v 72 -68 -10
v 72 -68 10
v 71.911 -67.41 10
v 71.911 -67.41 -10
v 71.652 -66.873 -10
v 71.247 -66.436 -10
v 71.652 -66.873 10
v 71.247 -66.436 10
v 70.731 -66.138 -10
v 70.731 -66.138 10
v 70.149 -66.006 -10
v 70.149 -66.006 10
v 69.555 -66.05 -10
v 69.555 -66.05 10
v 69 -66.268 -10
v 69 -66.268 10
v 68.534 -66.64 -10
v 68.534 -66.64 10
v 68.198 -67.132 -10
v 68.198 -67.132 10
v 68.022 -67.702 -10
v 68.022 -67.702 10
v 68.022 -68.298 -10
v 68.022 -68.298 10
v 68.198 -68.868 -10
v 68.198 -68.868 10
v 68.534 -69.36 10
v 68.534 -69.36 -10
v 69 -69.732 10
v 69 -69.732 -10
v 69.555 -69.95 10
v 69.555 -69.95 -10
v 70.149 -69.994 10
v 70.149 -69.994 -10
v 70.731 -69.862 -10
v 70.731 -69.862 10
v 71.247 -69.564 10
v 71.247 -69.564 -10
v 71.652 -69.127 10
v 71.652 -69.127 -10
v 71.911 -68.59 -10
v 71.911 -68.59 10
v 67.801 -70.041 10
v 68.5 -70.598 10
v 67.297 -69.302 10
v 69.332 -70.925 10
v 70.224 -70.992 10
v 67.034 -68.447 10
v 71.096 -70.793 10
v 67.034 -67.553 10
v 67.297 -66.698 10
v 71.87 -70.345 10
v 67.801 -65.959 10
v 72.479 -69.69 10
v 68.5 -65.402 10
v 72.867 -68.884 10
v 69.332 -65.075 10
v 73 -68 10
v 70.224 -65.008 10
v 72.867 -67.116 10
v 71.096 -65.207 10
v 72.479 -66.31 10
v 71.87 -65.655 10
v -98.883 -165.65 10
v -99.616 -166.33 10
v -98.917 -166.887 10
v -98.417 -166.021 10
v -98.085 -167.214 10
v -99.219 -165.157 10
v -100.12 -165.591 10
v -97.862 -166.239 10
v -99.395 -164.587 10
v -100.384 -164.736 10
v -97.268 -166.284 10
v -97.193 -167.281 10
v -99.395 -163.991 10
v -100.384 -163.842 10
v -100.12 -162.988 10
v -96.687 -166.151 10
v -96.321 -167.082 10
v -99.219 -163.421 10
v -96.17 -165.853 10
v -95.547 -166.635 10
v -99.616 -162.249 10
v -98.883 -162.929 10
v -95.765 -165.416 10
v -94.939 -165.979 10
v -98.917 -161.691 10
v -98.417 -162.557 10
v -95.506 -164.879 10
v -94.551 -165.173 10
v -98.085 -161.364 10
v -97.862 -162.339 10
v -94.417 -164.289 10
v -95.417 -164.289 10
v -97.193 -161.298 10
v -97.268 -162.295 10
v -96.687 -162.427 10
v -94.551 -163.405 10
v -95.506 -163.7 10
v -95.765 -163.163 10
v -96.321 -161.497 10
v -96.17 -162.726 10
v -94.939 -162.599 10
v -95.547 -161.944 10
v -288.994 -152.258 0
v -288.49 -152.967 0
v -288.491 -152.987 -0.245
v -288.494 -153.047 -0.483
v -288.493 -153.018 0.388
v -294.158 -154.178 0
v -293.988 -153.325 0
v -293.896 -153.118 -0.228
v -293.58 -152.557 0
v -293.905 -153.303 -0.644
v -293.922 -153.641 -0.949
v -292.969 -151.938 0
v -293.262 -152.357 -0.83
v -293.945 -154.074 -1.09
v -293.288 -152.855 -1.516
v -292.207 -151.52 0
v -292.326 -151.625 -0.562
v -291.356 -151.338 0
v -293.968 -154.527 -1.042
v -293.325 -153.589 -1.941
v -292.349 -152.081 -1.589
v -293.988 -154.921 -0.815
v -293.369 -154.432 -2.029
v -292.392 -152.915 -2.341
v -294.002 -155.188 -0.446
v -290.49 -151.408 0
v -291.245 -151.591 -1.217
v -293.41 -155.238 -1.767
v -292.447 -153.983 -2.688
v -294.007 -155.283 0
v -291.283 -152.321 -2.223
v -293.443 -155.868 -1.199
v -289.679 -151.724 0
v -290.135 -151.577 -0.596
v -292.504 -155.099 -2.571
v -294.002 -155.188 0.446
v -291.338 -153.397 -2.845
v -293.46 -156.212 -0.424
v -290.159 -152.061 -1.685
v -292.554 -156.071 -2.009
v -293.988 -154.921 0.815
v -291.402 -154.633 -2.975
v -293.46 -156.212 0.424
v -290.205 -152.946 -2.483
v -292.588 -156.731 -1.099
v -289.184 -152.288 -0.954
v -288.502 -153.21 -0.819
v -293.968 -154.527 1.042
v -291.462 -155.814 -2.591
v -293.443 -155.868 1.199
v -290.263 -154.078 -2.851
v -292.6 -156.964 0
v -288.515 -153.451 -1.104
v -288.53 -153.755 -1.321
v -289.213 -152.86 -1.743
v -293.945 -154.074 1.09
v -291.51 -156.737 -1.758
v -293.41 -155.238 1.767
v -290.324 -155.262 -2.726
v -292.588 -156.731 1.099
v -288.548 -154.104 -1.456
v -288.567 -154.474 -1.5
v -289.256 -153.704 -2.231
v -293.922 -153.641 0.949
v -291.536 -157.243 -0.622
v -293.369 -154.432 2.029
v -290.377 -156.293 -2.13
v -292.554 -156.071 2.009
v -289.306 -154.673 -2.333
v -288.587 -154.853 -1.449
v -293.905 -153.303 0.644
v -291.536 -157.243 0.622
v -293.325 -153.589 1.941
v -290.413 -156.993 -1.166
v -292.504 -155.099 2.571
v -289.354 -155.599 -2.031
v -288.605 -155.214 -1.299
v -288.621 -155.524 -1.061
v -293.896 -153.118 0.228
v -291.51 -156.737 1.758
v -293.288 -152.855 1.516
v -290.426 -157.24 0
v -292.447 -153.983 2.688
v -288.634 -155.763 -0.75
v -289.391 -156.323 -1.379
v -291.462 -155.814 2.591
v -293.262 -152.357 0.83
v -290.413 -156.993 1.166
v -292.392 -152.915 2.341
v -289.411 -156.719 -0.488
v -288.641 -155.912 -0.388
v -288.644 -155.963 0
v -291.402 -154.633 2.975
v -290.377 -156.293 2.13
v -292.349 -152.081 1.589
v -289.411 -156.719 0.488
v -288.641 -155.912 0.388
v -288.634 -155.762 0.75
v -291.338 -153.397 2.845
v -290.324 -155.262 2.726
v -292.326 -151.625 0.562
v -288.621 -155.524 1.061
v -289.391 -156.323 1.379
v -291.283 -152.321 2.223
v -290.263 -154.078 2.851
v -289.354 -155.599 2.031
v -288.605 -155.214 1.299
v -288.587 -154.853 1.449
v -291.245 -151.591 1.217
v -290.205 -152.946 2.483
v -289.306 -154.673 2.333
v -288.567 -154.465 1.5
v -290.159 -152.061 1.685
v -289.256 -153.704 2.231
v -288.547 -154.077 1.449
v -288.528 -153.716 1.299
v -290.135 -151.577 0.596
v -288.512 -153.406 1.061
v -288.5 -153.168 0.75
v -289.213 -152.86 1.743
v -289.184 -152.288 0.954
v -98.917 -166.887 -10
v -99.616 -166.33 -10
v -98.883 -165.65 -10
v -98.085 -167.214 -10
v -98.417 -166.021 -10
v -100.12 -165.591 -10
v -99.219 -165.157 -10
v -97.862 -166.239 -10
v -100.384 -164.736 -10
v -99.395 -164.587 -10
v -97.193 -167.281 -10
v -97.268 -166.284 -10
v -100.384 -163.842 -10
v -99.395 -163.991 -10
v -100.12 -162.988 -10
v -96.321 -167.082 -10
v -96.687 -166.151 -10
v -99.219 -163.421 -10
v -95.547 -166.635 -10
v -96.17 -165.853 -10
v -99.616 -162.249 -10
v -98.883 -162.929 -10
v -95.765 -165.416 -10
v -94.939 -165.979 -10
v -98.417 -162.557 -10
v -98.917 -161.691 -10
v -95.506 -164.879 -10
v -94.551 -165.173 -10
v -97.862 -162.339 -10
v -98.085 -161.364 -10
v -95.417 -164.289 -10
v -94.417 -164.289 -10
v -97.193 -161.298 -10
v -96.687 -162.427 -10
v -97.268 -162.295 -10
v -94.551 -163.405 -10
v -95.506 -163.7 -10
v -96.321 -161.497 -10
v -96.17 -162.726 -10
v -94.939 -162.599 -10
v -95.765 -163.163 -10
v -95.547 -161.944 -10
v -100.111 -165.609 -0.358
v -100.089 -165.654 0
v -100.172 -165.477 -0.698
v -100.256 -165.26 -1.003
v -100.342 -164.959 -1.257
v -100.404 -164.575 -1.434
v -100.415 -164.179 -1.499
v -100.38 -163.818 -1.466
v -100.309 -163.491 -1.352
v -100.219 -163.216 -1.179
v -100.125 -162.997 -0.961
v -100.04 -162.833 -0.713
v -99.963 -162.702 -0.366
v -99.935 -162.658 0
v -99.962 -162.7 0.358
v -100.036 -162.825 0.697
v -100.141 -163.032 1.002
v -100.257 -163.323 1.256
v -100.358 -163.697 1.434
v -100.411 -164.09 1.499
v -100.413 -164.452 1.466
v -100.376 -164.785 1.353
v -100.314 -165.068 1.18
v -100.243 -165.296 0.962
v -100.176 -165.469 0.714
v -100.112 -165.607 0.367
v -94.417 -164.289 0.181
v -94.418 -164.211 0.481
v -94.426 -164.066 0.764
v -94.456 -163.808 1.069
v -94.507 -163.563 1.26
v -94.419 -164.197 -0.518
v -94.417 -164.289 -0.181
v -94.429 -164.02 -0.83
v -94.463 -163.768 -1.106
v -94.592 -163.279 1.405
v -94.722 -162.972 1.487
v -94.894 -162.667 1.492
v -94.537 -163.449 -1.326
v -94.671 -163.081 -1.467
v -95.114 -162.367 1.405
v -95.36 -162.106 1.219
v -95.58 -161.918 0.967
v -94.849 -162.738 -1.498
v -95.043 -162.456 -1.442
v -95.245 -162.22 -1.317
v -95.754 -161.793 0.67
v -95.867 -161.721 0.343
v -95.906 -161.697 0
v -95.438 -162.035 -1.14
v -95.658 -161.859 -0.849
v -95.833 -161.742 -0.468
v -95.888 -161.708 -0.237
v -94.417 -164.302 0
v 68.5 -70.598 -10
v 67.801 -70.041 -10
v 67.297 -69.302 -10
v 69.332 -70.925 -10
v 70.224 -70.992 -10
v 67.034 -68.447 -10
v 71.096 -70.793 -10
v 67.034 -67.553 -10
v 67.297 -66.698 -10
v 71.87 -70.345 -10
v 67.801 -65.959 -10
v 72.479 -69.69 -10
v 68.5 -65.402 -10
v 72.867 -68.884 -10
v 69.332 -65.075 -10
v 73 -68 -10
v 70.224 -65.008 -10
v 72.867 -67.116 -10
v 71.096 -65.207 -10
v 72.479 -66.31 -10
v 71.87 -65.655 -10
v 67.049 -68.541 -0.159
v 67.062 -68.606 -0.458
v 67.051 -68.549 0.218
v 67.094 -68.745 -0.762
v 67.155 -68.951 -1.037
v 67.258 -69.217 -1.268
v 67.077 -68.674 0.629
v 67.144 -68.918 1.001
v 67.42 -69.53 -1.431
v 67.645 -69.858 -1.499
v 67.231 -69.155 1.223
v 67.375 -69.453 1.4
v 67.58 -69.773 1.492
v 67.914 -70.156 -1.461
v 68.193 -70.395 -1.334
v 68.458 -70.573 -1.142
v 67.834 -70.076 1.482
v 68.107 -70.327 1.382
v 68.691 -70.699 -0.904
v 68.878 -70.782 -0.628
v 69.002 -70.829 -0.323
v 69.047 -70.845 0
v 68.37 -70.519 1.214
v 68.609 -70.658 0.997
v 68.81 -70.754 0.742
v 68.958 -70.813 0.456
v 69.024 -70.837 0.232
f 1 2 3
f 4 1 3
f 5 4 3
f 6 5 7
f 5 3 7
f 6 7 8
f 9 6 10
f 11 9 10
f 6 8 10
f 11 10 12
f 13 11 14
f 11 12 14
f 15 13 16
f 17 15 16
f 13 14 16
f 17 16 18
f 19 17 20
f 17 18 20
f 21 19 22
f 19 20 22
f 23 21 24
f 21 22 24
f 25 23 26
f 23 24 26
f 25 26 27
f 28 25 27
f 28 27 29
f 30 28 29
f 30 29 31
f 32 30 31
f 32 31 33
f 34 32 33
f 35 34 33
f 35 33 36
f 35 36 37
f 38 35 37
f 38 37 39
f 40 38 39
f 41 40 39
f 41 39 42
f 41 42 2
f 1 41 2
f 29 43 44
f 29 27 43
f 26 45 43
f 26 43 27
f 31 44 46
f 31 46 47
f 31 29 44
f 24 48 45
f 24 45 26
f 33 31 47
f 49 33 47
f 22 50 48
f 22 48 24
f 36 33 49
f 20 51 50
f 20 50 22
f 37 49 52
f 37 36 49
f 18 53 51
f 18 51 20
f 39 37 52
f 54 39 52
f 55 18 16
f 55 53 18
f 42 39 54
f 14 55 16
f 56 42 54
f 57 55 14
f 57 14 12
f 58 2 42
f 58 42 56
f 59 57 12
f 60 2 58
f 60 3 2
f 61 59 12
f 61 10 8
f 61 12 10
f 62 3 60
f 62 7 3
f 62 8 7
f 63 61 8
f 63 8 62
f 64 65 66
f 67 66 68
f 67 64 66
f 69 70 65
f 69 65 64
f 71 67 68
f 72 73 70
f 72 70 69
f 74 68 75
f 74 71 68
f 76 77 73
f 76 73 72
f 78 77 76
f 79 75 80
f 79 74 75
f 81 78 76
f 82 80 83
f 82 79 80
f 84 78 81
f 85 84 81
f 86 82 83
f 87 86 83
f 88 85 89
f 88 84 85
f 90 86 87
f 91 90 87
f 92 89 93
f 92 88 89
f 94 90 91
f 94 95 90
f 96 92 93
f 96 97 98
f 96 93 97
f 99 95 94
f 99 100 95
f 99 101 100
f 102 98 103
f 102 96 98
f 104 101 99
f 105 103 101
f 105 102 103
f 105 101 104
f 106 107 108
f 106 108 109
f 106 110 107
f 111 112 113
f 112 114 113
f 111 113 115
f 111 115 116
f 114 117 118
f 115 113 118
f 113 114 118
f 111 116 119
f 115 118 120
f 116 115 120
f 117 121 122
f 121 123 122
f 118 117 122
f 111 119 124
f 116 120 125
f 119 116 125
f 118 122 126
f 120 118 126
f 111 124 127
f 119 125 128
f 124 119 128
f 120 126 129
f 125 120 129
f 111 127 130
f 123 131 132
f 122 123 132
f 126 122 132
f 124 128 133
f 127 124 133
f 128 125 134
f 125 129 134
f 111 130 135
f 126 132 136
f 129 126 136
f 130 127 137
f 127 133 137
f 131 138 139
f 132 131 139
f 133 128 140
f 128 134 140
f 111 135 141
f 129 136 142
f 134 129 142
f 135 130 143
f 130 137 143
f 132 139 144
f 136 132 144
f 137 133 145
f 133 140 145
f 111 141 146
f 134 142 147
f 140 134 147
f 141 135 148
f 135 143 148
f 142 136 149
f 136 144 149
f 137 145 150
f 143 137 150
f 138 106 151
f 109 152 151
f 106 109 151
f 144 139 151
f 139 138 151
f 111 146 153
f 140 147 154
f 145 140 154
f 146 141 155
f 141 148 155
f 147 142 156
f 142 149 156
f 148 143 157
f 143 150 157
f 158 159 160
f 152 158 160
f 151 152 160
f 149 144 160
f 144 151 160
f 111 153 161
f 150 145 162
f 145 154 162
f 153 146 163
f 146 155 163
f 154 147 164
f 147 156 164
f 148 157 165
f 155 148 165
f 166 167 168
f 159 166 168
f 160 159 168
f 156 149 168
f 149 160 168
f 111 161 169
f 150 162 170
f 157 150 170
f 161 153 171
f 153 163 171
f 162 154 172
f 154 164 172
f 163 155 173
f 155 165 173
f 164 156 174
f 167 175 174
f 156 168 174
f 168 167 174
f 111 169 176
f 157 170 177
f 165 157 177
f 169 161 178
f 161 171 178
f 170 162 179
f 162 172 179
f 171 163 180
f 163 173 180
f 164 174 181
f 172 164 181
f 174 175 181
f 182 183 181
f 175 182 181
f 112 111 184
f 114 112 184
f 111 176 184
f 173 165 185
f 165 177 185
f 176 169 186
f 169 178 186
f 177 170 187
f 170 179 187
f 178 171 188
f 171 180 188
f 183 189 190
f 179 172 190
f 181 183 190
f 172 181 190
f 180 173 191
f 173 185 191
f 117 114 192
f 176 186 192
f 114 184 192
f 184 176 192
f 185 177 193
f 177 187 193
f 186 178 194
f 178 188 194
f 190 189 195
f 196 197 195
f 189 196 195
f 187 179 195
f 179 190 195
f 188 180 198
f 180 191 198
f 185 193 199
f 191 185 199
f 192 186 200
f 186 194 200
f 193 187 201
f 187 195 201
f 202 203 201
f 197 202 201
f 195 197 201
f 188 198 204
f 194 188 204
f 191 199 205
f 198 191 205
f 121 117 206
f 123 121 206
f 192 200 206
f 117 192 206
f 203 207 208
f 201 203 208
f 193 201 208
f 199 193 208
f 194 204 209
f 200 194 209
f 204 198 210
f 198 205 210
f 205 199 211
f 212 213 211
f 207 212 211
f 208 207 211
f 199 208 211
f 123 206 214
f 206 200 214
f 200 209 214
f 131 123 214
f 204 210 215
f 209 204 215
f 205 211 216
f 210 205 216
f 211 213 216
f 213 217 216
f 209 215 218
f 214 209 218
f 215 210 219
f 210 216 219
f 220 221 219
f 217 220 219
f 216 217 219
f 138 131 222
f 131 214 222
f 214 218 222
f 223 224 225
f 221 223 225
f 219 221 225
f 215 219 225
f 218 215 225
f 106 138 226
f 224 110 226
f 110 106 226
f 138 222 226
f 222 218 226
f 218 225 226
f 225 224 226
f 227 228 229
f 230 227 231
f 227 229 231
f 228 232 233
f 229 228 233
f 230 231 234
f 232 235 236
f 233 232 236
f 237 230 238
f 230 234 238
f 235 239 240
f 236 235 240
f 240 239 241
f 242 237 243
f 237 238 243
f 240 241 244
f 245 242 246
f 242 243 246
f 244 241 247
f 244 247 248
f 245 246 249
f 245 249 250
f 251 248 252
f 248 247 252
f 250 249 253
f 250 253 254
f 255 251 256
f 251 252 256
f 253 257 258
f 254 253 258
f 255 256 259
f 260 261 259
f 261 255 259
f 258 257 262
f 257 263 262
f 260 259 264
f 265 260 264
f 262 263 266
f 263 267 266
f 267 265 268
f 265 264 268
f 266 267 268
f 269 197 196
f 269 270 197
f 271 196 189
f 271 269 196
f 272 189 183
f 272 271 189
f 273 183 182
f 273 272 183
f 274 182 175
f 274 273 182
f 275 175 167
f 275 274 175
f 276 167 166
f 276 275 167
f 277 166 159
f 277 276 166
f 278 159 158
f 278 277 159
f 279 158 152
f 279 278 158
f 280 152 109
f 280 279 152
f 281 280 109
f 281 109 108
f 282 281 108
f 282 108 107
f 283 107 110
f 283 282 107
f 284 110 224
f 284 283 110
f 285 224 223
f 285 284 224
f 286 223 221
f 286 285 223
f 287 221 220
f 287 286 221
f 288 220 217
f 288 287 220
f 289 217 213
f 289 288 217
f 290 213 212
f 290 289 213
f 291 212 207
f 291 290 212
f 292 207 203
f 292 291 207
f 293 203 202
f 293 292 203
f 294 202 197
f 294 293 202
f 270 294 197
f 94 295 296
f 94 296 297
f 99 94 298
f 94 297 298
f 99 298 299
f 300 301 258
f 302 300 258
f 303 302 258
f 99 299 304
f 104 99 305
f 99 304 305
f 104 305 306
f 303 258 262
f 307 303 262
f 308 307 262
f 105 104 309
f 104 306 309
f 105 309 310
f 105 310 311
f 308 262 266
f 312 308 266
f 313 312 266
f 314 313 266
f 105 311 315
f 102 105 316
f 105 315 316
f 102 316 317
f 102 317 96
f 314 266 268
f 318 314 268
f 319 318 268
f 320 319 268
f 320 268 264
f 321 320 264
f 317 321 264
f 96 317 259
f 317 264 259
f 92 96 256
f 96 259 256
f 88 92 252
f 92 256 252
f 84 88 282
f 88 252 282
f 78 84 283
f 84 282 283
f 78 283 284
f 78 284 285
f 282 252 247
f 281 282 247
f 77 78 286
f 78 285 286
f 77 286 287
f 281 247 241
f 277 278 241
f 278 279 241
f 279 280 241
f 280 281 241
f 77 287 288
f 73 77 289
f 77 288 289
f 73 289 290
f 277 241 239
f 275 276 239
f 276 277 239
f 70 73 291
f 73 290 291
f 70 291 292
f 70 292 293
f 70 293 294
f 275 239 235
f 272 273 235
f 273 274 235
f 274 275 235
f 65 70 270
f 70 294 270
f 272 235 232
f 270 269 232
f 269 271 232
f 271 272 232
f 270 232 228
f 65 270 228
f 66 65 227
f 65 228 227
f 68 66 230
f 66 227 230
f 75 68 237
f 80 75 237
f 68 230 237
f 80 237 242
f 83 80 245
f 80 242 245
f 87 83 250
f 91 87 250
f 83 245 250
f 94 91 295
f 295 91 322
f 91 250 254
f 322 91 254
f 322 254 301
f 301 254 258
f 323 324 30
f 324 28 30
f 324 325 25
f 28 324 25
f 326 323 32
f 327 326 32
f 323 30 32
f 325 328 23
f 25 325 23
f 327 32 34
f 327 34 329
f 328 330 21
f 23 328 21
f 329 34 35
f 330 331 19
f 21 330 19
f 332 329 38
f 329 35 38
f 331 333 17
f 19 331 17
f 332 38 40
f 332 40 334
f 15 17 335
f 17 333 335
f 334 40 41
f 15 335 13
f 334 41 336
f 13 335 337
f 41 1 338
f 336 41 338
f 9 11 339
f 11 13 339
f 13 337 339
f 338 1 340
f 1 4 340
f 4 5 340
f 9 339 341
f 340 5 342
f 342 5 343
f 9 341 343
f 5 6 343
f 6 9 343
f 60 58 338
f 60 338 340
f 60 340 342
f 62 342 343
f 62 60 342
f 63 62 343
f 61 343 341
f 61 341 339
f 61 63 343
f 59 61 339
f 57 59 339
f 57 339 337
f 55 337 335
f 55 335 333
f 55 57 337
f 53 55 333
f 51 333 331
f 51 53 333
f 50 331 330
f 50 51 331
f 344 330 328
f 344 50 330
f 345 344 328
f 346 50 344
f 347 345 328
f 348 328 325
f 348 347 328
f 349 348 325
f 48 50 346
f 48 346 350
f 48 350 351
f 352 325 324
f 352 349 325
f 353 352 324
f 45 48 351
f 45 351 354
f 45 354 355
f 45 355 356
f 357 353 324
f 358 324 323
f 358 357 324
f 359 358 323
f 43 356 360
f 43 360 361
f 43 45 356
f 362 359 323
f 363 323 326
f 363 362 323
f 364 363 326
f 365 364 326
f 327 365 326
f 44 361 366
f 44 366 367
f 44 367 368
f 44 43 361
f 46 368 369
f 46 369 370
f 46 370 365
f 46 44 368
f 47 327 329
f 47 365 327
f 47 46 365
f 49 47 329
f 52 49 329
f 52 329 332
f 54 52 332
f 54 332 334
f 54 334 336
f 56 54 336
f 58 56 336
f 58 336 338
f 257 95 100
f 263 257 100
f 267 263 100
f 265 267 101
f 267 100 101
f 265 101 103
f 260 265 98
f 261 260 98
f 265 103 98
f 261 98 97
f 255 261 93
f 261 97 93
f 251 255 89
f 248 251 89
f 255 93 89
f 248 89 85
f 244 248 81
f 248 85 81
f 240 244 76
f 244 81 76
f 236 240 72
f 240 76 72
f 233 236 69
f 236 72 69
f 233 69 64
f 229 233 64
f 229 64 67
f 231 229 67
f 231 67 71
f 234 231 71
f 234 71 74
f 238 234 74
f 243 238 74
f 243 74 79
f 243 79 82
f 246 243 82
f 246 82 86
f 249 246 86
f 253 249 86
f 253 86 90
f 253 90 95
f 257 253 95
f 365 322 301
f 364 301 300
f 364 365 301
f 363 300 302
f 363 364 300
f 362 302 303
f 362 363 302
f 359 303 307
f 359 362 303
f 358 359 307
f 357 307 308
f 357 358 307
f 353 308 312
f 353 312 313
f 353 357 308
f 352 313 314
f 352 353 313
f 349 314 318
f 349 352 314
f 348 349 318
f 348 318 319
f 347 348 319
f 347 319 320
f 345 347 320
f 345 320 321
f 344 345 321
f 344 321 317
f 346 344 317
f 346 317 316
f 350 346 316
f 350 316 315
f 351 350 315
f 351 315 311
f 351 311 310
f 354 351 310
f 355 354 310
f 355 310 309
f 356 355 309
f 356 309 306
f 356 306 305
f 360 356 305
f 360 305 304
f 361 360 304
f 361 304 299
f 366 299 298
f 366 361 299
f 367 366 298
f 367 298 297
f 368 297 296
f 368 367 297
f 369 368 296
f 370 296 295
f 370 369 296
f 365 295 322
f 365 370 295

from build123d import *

# Parameters (mm, degrees)
ESQUISSE4_R             = 1.5
ESQUISSE6_R             = 3
BOSS_EXTRU_1_DEPTH      = 10
ESQUISSE7_R             = 2
ENL_V_MAT_EXTRU_1_DEPTH = 339.993691721


with BuildPart() as part:
    # Balayage1: sweep along a path in Esquisse3
    with BuildLine(Plane.XY) as balayage1_path:
        Line((-291.161591592, -154.331808471), (-97.417301145, -164.289213701))
        Line((-97.417301145, -164.289213701), (71, -68))
    # Esquisse4 → Balayage1 (sweep)
    with BuildSketch(Plane(origin=(-291.161591592, -154.331808471, 0), x_dir=(-0.05132683108289724, -0.9986819095242427, 0), z_dir=(0.9986819095242427, -0.05132683108289724, 0))):
        Circle(ESQUISSE4_R)
    sweep(path=balayage1_path.line, transition=Transition.RIGHT)

    # Esquisse5 → Révolution1 (revolve)
    with BuildSketch(Plane.XY):
        with BuildLine():
            Line((-288.165545864, -154.485788964), (-294.157637321, -154.177827978))
            ThreePointArc((-294.157637321, -154.177827978), (-291.007611099, -151.335762742), (-288.165545864, -154.485788964))
        make_face()
    revolve(axis=Axis((-288.165545864, -154.485788964, 0), (-0.9986819095242425, 0.05132683108290165, 0)))

    # Esquisse6 → Boss.-Extru.1 (add, symmetric)
    with BuildSketch(Plane.XY):
        with Locations((-97.417301145, -164.289213701)):
            Circle(ESQUISSE6_R)
        with Locations((70, -68)):
            Circle(ESQUISSE6_R)
    extrude(amount=BOSS_EXTRU_1_DEPTH, both=True)

    # Esquisse7 → Enlèv. mat.-Extru.1 (cut, through all)
    with BuildSketch(Plane.XY.offset(10)):
        with Locations((-97.417301145, -164.289213701)):
            Circle(ESQUISSE7_R)
        with Locations((70, -68)):
            Circle(ESQUISSE7_R)
    extrude(amount=-ENL_V_MAT_EXTRU_1_DEPTH, mode=Mode.SUBTRACT)


solid = part.part
